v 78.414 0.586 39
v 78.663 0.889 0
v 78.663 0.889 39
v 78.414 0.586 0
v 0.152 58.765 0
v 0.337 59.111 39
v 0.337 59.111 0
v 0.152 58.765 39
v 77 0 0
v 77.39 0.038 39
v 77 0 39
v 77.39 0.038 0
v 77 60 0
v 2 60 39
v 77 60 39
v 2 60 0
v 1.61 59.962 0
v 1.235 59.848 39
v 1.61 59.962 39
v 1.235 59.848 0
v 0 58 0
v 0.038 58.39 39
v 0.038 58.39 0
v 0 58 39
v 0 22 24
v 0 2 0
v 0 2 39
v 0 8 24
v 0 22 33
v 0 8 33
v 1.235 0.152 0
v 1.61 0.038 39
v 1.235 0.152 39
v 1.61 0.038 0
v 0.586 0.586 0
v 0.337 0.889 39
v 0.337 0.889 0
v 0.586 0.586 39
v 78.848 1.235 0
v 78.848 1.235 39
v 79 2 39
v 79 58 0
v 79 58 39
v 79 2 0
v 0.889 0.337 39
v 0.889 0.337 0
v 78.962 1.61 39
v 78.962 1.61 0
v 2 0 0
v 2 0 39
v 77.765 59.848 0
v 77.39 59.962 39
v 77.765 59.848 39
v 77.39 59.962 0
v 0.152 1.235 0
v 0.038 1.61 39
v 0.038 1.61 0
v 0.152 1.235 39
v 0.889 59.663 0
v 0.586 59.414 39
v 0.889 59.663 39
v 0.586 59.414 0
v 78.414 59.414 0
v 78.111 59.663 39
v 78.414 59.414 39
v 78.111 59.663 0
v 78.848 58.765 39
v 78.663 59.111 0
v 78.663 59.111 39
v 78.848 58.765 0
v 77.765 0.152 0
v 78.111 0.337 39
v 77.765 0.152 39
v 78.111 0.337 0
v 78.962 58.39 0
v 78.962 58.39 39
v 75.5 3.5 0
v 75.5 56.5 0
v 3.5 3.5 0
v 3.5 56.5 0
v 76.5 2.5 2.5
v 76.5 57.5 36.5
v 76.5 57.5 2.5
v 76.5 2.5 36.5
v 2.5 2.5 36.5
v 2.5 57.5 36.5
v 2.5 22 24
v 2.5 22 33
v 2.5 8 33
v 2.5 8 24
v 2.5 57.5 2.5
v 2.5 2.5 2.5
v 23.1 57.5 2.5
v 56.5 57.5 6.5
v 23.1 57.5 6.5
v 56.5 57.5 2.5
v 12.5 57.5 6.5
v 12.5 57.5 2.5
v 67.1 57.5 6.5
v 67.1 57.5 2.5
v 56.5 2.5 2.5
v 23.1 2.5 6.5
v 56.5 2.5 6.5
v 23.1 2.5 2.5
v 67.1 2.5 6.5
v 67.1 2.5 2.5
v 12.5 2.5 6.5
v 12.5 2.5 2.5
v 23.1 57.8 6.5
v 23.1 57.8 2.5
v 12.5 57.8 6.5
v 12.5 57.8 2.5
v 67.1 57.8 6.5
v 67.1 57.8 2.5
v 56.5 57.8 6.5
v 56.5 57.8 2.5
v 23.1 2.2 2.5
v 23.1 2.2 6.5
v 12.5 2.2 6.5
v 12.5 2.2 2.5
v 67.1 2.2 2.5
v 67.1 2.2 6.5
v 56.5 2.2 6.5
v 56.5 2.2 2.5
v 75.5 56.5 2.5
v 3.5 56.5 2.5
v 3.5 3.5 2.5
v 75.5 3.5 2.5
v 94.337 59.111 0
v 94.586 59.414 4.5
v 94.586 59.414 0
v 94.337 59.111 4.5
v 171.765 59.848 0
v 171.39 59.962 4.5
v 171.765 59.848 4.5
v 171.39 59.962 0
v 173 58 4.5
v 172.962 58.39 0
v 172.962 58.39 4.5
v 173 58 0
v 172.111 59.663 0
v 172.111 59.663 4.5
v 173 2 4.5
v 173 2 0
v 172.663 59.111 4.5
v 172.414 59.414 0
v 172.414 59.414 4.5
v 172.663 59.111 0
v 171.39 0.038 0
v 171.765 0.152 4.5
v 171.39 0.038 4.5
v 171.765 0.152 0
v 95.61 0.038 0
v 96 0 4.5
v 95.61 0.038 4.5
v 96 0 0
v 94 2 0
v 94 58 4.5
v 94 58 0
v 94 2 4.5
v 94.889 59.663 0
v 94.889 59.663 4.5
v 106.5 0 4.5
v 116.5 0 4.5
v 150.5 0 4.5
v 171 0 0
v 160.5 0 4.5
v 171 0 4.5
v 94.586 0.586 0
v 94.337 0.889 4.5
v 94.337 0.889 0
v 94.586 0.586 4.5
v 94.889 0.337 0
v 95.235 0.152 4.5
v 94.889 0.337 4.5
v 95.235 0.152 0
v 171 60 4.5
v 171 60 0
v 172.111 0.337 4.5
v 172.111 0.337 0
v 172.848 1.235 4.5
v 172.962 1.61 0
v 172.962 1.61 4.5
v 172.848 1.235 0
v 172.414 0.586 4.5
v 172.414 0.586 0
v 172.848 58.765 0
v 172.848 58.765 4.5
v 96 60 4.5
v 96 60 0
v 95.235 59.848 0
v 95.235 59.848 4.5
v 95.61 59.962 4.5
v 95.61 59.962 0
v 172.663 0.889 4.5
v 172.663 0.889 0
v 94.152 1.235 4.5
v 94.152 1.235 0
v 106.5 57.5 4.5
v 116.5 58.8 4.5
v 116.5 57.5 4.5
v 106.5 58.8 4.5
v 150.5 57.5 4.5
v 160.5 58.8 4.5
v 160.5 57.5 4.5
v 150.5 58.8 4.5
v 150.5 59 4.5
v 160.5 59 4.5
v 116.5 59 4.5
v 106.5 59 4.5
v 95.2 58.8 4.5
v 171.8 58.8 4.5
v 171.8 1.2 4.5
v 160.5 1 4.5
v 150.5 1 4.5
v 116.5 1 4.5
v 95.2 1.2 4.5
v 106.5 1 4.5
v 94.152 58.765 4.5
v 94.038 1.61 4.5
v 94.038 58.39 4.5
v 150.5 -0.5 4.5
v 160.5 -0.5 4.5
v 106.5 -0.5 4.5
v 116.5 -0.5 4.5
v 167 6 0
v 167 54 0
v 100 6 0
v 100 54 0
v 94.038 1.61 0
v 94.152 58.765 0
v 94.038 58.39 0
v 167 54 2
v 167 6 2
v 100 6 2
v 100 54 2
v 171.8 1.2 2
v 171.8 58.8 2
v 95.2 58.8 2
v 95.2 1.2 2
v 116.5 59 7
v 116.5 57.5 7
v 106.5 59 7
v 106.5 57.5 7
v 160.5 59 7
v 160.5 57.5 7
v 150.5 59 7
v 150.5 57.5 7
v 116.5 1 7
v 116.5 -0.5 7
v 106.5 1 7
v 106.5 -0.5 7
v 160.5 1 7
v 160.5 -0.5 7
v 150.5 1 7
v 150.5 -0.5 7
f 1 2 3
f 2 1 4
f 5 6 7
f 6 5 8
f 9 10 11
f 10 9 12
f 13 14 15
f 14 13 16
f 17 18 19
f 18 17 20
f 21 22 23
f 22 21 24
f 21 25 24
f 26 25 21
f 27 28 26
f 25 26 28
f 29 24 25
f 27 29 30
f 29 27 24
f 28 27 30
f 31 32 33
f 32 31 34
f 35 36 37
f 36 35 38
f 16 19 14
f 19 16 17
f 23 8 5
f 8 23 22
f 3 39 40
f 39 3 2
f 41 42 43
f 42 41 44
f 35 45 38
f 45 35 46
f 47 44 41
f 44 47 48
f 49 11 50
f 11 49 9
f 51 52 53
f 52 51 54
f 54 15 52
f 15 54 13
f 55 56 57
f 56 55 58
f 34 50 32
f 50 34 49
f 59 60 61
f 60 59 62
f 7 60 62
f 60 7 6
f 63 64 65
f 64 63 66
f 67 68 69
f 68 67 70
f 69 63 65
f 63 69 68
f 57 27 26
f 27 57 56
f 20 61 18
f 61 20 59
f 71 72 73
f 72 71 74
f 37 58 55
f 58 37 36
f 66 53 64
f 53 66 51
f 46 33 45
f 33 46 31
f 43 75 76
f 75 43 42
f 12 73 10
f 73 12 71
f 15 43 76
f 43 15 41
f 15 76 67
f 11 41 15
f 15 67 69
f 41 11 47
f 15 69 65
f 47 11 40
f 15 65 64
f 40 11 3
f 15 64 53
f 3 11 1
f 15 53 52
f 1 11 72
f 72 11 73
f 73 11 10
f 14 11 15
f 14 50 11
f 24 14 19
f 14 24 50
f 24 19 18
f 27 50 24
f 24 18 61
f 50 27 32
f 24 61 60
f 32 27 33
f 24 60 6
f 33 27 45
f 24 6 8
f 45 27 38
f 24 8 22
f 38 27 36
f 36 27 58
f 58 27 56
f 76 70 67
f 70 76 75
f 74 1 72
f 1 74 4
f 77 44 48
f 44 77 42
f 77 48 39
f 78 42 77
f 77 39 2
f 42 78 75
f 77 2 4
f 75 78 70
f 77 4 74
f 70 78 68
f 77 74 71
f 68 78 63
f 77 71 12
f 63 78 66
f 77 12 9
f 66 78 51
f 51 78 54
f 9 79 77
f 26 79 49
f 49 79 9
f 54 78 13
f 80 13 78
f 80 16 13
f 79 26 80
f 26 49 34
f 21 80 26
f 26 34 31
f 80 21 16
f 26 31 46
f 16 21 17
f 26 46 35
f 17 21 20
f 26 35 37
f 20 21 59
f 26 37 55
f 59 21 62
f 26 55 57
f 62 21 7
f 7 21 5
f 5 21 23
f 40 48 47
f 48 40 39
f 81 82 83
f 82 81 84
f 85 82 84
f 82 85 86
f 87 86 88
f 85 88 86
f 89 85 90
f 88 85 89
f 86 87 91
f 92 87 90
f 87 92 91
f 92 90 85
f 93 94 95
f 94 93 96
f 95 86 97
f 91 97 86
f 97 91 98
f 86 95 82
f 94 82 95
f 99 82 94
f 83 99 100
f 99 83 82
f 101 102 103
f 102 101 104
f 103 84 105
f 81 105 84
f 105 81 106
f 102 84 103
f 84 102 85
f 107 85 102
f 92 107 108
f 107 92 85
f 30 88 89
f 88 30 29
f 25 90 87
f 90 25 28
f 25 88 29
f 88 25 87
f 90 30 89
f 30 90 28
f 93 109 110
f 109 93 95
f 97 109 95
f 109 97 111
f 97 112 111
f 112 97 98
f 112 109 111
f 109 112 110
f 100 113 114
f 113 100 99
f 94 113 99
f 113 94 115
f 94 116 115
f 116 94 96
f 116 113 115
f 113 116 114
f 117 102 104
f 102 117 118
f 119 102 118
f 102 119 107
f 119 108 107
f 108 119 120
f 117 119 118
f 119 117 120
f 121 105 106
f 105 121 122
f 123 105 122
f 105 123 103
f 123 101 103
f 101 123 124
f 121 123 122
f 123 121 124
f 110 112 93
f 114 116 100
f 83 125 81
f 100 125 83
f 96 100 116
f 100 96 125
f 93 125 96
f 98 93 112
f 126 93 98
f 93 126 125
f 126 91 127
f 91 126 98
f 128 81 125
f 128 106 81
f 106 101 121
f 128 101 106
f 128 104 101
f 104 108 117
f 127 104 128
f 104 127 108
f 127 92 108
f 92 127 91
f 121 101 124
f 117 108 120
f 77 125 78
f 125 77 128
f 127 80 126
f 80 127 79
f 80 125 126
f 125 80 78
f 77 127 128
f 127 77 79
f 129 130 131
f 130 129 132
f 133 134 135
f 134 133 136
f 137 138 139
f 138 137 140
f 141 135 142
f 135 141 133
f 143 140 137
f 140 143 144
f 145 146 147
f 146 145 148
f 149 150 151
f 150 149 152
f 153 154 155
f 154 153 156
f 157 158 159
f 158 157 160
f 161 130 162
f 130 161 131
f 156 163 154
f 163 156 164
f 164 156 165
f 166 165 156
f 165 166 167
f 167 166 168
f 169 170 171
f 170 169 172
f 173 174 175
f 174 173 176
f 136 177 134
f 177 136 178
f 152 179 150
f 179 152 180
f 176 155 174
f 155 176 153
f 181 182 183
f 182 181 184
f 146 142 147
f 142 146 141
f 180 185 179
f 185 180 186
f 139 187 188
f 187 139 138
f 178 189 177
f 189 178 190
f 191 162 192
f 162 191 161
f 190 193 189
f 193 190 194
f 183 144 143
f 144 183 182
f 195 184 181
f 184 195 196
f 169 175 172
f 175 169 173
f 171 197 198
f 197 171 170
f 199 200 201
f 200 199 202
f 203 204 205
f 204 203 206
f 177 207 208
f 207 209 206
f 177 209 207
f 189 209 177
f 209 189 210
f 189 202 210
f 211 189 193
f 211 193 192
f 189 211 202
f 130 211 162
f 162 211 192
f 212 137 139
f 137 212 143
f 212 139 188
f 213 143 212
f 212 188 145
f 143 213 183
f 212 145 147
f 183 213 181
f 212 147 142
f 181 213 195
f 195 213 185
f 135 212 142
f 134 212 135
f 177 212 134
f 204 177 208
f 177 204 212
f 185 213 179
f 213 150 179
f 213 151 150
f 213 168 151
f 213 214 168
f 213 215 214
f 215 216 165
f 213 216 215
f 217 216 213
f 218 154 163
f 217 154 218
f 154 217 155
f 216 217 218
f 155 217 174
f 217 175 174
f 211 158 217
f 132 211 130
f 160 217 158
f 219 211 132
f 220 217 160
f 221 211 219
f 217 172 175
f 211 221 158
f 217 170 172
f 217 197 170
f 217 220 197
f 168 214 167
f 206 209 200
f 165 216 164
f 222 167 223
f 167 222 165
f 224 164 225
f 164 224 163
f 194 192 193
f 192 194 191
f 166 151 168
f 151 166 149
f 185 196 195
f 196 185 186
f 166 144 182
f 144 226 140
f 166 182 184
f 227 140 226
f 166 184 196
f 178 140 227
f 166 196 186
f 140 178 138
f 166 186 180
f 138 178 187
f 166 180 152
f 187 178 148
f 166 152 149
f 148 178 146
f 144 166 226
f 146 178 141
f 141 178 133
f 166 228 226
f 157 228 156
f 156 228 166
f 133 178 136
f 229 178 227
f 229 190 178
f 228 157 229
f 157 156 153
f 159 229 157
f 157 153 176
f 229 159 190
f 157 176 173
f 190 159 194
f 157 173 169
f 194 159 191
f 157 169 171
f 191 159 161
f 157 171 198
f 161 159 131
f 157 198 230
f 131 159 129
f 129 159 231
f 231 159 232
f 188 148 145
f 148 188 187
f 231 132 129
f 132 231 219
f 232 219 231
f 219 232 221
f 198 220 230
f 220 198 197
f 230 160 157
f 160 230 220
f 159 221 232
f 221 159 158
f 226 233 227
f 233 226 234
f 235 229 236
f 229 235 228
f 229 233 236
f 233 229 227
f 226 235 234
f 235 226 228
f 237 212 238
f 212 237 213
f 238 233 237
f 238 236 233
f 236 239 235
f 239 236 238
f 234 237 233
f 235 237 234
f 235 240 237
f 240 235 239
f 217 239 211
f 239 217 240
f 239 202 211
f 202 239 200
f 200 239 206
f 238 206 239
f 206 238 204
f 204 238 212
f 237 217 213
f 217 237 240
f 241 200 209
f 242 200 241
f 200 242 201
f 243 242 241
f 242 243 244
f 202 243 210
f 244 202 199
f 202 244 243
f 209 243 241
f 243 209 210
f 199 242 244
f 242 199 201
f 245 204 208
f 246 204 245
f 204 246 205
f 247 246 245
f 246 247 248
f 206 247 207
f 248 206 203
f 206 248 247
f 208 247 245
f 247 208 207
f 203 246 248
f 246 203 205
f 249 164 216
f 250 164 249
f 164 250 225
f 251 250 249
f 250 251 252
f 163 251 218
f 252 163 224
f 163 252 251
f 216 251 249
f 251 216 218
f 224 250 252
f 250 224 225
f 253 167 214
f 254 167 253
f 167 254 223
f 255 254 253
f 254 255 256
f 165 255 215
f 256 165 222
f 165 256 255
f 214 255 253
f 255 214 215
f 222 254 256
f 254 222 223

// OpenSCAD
// =============================================================================
// AIR QUALITY RECEIVER - ENCLOSURE v2.3
// =============================================================================
// Obudowa do druku 3D dla projektu Air Quality Receiver
// 
// Drukarka: Creality Ender-3 Pro
// Filament: Devil Design PLA 1.75mm Black
// Tolerancja druku FDM: +/- 0.3mm
//
// Data: 2026-01-04
// Wersja: 2.3 (USB-C na lewej, orientacja druku poprawiona)
// =============================================================================

// === WYMIARY RZECZYWISTE KOMPONENTOW (ZMIERZONE!) ===
// LCD Waveshare Pico-ResTouch-LCD-2.8:
//   - PCB: 71.2 x 52.5 mm (zmierzone suwmiarka)
//   - Aktywny obszar dotykowy: 62 x 48 mm
//   - Orientacja: landscape (dluzszy wymiar wzdluz X)
// Stos elektroniki (LCD + adapter + XIAO + SX1262): 32mm

// === WYMIARY ZEWNETRZNE (dostosowane do pomiaru) ===
width = 79;      // szerokosc (X) - PCB 71.2 + luz 1mm/strone + scianki 2x2.5
height = 60;     // wysokosc (Y) - PCB 52.5 + luz 1mm/strone + scianki 2x2.5
depth = 39;      // glebokosc (Z) - stos 32mm + luz 4mm

// === SCIANKA ===
wall = 2.5;      // grubosc scianki

// === WYMIARY WEWNETRZNE (obliczone) ===
// Szerokosc wewn: 79 - 2*2.5 = 74mm (PCB 71.2mm = luz 2.8mm = 1.4mm/strone)
// Wysokosc wewn: 60 - 2*2.5 = 55mm (PCB 52.5mm = luz 2.5mm = 1.25mm/strone)
// Glebokosc wewn: 39 - 2.5 = 36.5mm (stos 32mm = luz 4.5mm)

// === LCD OTWOR (wiekszy niz aktywny obszar) ===
// Aktywny obszar LCD: 62 x 48 mm
// Otwor widoczny: wiekszy dla estetyki i latwego dostepu
lcd_visible_w = 67;    // 62 + 5 = margines 2.5mm/strone
lcd_visible_h = 48;    // rowny aktywny obszar (symetrycznie wycentrowany)

// Polka na PCB: PCB 71.2 x 52.5 + luz ~0.9mm/strone
lcd_shelf_w = 73;      // 71.2 + 1.8 = luz na wejscie PCB
lcd_shelf_h = 55;      // 52.5 + 2.5 = luz na wejscie PCB
lcd_glass = 2.0;       // glebokosc uskoku (grubosc panelu LCD)

// === USB-C (LEWA scianka patrzac na LCD, NA GORZE) ===
usb_w = 14;        // szerokosc otworu wzdluz Y
usb_h = 9;         // glebokosc otworu wzdluz Z
usb_from_bottom = 8;  // od DOLNEJ krawedzi do dolu otworu (po obrocie bedzie na gorze)
usb_from_back = 6; // od tylnej krawedzi do konca otworu

// === ZAOKRAGLENIE ===
r = 2;

// === TOLERANCJA DRUKU FDM ===
tol = 0.3;         // tolerancja dla laczenia czesci

// === ZATRZASKI SNAP-FIT ===
snap_w = 10;           // szerokosc zatrzasku
snap_h = 2.5;          // wysokosc zatrzasku
snap_d = 1.5;          // glebokosc zatrzasku
snap_tol = 0.3;        // luz dla zatrzasku

// === RENDER MODE ===
// Uzyj: openscad -D 'part="body"' -o case_body.stl air_quality_case.scad
part = "both";  // "body", "frame", "both"

$fn = 32;  // jakosc krzywych

// =============================================================================
// KORPUS (case_body)
// =============================================================================
module body() {
    difference() {
        // Zewnetrzna bryla z zaokragleniami
        hull() {
            // 4 slupki w rogach
            translate([r, r, 0]) cylinder(r=r, h=depth);
            translate([width-r, r, 0]) cylinder(r=r, h=depth);
            translate([r, height-r, 0]) cylinder(r=r, h=depth);
            translate([width-r, height-r, 0]) cylinder(r=r, h=depth);
        }
        
        // Wnetrze (otwarte od przodu Z=0, zamkniete z tylu)
        translate([wall, wall, -1])
            cube([width - 2*wall, height - 2*wall, depth - wall + 1]);
        
        // Otwor USB-C na LEWEJ sciance, na GORZE (patrzac na LCD od frontu)
        // Po obrocie 180 wokol X: dolna czesc Y staje sie gorna
        // usb_w (14mm) wzdluz Y, usb_h (9mm) wzdluz Z
        translate([-1, usb_from_bottom, depth - usb_from_back - usb_h])
            cube([wall + 2, usb_w, usb_h]);
        
        // Gniazda na zatrzaski (4 szt) - wciecia w sciankach
        // Gorne lewe
        translate([wall + 10, height - wall - snap_h - snap_tol, wall - 1])
            cube([snap_w + 2*snap_tol, snap_h + 2*snap_tol, snap_d + wall + 1]);
        // Gorne prawe
        translate([width - wall - 10 - snap_w, height - wall - snap_h - snap_tol, wall - 1])
            cube([snap_w + 2*snap_tol, snap_h + 2*snap_tol, snap_d + wall + 1]);
        // Dolne lewe
        translate([wall + 10, wall - snap_tol, wall - 1])
            cube([snap_w + 2*snap_tol, snap_h + 2*snap_tol, snap_d + wall + 1]);
        // Dolne prawe
        translate([width - wall - 10 - snap_w, wall - snap_tol, wall - 1])
            cube([snap_w + 2*snap_tol, snap_h + 2*snap_tol, snap_d + wall + 1]);
    }
    
    // Wewnetrzna krawedz do oparcia ramki
    difference() {
        translate([wall - 1, wall - 1, 0])
            cube([width - 2*wall + 2, height - 2*wall + 2, wall]);
        translate([wall + 1, wall + 1, -1])
            cube([width - 2*wall - 2, height - 2*wall - 2, wall + 2]);
    }
}

// =============================================================================
// RAMKA PRZEDNIA (case_frame)
// =============================================================================
module frame() {
    frame_depth = wall + lcd_glass;
    
    difference() {
        // Zewnetrzna bryla ramki
        hull() {
            translate([r, r, 0]) cylinder(r=r, h=frame_depth);
            translate([width-r, r, 0]) cylinder(r=r, h=frame_depth);
            translate([r, height-r, 0]) cylinder(r=r, h=frame_depth);
            translate([width-r, height-r, 0]) cylinder(r=r, h=frame_depth);
        }
        
        // Otwor widoczny na LCD (WIEKSZY niz aktywny obszar - dla palca)
        translate([(width - lcd_visible_w)/2, (height - lcd_visible_h)/2, -1])
            cube([lcd_visible_w, lcd_visible_h, frame_depth + 2]);
        
        // Polka/uskok na PCB LCD (wiekszy otwor z luzem, tylko na glebok lcd_glass)
        translate([(width - lcd_shelf_w)/2, (height - lcd_shelf_h)/2, wall])
            cube([lcd_shelf_w, lcd_shelf_h, lcd_glass + 1]);
        
        // Wciecie na krawedz korpusu (wpust ramki w korpus)
        translate([wall - 1 - tol, wall - 1 - tol, frame_depth - wall])
            cube([width - 2*wall + 2 + 2*tol, height - 2*wall + 2 + 2*tol, wall + 1]);
    }
    
    // Zatrzaski snap-fit (4 szt) - wypustki
    // Gorne lewe
    translate([wall + 10, height - wall, frame_depth])
        snap_tab();
    // Gorne prawe
    translate([width - wall - 10 - snap_w, height - wall, frame_depth])
        snap_tab();
    // Dolne lewe
    translate([wall + 10, wall - snap_d, frame_depth])
        mirror([0, 1, 0]) snap_tab();
    // Dolne prawe
    translate([width - wall - 10 - snap_w, wall - snap_d, frame_depth])
        mirror([0, 1, 0]) snap_tab();
}

// Zatrzask - prosty klin
module snap_tab() {
    // Prostokatna wypustka
    cube([snap_w, snap_d, snap_h]);
}

// =============================================================================
// RENDEROWANIE
// =============================================================================
if (part == "body") {
    // Obrot 180 wokol X - tylna sciana na stole, otwor LCD na gorze
    translate([0, height, depth])
        rotate([180, 0, 0])
            body();
} else if (part == "frame") {
    frame();
} else if (part == "both") {
    // Oba elementy obok siebie do podgladu
    color("DimGray") body();
    color("Gray") translate([width + 15, 0, 0]) frame();
}

// =============================================================================
// INFO I WERYFIKACJA WYMIAROW
// =============================================================================
echo(str(""));
echo(str("=== AIR QUALITY ENCLOSURE v2.3 ==="));
echo(str(""));
echo(str("WYMIARY ZEWNETRZNE: ", width, " x ", height, " x ", depth, " mm"));
echo(str("Grubosc scianki: ", wall, " mm"));
echo(str(""));
echo(str("WYMIARY WEWNETRZNE:"));
echo(str("  Szerokosc: ", width - 2*wall, " mm (PCB 70.2mm = luz ", width - 2*wall - 70.2, " mm)"));
echo(str("  Wysokosc: ", height - 2*wall, " mm (PCB 50.2mm = luz ", height - 2*wall - 50.2, " mm)"));
echo(str("  Glebokosc: ", depth - wall, " mm (stos 32mm = luz ", depth - wall - 32, " mm)"));
echo(str(""));
echo(str("LCD OTWOR WIDOCZNY: ", lcd_visible_w, " x ", lcd_visible_h, " mm"));
echo(str("  Aktywny obszar: 62 x 48 mm"));
echo(str("  Margines na palec: ", (lcd_visible_w - 62)/2, " x ", (lcd_visible_h - 48)/2, " mm/strone"));
echo(str(""));
echo(str("LCD POLKA NA PCB: ", lcd_shelf_w, " x ", lcd_shelf_h, " mm"));
echo(str("  PCB: 71.2 x 52.5 mm"));
echo(str("  Luz: ", (lcd_shelf_w - 71.2)/2, " x ", (lcd_shelf_h - 52.5)/2, " mm/strone"));
echo(str(""));
echo(str("RAMKA WOKOL OTWORU LCD:"));
echo(str("  Szerokosc ramki: ", (width - lcd_visible_w)/2, " mm"));
echo(str("  Wysokosc ramki: ", (height - lcd_visible_h)/2, " mm"));
echo(str(""));
echo(str("USB-C: ", usb_w, "x", usb_h, "mm na LEWEJ sciance, NA GORZE (patrzac na LCD)"));
echo(str("  ", usb_from_bottom, "mm od gornej krawedzi, ", usb_from_back, "mm od tylu"));
echo(str(""));
